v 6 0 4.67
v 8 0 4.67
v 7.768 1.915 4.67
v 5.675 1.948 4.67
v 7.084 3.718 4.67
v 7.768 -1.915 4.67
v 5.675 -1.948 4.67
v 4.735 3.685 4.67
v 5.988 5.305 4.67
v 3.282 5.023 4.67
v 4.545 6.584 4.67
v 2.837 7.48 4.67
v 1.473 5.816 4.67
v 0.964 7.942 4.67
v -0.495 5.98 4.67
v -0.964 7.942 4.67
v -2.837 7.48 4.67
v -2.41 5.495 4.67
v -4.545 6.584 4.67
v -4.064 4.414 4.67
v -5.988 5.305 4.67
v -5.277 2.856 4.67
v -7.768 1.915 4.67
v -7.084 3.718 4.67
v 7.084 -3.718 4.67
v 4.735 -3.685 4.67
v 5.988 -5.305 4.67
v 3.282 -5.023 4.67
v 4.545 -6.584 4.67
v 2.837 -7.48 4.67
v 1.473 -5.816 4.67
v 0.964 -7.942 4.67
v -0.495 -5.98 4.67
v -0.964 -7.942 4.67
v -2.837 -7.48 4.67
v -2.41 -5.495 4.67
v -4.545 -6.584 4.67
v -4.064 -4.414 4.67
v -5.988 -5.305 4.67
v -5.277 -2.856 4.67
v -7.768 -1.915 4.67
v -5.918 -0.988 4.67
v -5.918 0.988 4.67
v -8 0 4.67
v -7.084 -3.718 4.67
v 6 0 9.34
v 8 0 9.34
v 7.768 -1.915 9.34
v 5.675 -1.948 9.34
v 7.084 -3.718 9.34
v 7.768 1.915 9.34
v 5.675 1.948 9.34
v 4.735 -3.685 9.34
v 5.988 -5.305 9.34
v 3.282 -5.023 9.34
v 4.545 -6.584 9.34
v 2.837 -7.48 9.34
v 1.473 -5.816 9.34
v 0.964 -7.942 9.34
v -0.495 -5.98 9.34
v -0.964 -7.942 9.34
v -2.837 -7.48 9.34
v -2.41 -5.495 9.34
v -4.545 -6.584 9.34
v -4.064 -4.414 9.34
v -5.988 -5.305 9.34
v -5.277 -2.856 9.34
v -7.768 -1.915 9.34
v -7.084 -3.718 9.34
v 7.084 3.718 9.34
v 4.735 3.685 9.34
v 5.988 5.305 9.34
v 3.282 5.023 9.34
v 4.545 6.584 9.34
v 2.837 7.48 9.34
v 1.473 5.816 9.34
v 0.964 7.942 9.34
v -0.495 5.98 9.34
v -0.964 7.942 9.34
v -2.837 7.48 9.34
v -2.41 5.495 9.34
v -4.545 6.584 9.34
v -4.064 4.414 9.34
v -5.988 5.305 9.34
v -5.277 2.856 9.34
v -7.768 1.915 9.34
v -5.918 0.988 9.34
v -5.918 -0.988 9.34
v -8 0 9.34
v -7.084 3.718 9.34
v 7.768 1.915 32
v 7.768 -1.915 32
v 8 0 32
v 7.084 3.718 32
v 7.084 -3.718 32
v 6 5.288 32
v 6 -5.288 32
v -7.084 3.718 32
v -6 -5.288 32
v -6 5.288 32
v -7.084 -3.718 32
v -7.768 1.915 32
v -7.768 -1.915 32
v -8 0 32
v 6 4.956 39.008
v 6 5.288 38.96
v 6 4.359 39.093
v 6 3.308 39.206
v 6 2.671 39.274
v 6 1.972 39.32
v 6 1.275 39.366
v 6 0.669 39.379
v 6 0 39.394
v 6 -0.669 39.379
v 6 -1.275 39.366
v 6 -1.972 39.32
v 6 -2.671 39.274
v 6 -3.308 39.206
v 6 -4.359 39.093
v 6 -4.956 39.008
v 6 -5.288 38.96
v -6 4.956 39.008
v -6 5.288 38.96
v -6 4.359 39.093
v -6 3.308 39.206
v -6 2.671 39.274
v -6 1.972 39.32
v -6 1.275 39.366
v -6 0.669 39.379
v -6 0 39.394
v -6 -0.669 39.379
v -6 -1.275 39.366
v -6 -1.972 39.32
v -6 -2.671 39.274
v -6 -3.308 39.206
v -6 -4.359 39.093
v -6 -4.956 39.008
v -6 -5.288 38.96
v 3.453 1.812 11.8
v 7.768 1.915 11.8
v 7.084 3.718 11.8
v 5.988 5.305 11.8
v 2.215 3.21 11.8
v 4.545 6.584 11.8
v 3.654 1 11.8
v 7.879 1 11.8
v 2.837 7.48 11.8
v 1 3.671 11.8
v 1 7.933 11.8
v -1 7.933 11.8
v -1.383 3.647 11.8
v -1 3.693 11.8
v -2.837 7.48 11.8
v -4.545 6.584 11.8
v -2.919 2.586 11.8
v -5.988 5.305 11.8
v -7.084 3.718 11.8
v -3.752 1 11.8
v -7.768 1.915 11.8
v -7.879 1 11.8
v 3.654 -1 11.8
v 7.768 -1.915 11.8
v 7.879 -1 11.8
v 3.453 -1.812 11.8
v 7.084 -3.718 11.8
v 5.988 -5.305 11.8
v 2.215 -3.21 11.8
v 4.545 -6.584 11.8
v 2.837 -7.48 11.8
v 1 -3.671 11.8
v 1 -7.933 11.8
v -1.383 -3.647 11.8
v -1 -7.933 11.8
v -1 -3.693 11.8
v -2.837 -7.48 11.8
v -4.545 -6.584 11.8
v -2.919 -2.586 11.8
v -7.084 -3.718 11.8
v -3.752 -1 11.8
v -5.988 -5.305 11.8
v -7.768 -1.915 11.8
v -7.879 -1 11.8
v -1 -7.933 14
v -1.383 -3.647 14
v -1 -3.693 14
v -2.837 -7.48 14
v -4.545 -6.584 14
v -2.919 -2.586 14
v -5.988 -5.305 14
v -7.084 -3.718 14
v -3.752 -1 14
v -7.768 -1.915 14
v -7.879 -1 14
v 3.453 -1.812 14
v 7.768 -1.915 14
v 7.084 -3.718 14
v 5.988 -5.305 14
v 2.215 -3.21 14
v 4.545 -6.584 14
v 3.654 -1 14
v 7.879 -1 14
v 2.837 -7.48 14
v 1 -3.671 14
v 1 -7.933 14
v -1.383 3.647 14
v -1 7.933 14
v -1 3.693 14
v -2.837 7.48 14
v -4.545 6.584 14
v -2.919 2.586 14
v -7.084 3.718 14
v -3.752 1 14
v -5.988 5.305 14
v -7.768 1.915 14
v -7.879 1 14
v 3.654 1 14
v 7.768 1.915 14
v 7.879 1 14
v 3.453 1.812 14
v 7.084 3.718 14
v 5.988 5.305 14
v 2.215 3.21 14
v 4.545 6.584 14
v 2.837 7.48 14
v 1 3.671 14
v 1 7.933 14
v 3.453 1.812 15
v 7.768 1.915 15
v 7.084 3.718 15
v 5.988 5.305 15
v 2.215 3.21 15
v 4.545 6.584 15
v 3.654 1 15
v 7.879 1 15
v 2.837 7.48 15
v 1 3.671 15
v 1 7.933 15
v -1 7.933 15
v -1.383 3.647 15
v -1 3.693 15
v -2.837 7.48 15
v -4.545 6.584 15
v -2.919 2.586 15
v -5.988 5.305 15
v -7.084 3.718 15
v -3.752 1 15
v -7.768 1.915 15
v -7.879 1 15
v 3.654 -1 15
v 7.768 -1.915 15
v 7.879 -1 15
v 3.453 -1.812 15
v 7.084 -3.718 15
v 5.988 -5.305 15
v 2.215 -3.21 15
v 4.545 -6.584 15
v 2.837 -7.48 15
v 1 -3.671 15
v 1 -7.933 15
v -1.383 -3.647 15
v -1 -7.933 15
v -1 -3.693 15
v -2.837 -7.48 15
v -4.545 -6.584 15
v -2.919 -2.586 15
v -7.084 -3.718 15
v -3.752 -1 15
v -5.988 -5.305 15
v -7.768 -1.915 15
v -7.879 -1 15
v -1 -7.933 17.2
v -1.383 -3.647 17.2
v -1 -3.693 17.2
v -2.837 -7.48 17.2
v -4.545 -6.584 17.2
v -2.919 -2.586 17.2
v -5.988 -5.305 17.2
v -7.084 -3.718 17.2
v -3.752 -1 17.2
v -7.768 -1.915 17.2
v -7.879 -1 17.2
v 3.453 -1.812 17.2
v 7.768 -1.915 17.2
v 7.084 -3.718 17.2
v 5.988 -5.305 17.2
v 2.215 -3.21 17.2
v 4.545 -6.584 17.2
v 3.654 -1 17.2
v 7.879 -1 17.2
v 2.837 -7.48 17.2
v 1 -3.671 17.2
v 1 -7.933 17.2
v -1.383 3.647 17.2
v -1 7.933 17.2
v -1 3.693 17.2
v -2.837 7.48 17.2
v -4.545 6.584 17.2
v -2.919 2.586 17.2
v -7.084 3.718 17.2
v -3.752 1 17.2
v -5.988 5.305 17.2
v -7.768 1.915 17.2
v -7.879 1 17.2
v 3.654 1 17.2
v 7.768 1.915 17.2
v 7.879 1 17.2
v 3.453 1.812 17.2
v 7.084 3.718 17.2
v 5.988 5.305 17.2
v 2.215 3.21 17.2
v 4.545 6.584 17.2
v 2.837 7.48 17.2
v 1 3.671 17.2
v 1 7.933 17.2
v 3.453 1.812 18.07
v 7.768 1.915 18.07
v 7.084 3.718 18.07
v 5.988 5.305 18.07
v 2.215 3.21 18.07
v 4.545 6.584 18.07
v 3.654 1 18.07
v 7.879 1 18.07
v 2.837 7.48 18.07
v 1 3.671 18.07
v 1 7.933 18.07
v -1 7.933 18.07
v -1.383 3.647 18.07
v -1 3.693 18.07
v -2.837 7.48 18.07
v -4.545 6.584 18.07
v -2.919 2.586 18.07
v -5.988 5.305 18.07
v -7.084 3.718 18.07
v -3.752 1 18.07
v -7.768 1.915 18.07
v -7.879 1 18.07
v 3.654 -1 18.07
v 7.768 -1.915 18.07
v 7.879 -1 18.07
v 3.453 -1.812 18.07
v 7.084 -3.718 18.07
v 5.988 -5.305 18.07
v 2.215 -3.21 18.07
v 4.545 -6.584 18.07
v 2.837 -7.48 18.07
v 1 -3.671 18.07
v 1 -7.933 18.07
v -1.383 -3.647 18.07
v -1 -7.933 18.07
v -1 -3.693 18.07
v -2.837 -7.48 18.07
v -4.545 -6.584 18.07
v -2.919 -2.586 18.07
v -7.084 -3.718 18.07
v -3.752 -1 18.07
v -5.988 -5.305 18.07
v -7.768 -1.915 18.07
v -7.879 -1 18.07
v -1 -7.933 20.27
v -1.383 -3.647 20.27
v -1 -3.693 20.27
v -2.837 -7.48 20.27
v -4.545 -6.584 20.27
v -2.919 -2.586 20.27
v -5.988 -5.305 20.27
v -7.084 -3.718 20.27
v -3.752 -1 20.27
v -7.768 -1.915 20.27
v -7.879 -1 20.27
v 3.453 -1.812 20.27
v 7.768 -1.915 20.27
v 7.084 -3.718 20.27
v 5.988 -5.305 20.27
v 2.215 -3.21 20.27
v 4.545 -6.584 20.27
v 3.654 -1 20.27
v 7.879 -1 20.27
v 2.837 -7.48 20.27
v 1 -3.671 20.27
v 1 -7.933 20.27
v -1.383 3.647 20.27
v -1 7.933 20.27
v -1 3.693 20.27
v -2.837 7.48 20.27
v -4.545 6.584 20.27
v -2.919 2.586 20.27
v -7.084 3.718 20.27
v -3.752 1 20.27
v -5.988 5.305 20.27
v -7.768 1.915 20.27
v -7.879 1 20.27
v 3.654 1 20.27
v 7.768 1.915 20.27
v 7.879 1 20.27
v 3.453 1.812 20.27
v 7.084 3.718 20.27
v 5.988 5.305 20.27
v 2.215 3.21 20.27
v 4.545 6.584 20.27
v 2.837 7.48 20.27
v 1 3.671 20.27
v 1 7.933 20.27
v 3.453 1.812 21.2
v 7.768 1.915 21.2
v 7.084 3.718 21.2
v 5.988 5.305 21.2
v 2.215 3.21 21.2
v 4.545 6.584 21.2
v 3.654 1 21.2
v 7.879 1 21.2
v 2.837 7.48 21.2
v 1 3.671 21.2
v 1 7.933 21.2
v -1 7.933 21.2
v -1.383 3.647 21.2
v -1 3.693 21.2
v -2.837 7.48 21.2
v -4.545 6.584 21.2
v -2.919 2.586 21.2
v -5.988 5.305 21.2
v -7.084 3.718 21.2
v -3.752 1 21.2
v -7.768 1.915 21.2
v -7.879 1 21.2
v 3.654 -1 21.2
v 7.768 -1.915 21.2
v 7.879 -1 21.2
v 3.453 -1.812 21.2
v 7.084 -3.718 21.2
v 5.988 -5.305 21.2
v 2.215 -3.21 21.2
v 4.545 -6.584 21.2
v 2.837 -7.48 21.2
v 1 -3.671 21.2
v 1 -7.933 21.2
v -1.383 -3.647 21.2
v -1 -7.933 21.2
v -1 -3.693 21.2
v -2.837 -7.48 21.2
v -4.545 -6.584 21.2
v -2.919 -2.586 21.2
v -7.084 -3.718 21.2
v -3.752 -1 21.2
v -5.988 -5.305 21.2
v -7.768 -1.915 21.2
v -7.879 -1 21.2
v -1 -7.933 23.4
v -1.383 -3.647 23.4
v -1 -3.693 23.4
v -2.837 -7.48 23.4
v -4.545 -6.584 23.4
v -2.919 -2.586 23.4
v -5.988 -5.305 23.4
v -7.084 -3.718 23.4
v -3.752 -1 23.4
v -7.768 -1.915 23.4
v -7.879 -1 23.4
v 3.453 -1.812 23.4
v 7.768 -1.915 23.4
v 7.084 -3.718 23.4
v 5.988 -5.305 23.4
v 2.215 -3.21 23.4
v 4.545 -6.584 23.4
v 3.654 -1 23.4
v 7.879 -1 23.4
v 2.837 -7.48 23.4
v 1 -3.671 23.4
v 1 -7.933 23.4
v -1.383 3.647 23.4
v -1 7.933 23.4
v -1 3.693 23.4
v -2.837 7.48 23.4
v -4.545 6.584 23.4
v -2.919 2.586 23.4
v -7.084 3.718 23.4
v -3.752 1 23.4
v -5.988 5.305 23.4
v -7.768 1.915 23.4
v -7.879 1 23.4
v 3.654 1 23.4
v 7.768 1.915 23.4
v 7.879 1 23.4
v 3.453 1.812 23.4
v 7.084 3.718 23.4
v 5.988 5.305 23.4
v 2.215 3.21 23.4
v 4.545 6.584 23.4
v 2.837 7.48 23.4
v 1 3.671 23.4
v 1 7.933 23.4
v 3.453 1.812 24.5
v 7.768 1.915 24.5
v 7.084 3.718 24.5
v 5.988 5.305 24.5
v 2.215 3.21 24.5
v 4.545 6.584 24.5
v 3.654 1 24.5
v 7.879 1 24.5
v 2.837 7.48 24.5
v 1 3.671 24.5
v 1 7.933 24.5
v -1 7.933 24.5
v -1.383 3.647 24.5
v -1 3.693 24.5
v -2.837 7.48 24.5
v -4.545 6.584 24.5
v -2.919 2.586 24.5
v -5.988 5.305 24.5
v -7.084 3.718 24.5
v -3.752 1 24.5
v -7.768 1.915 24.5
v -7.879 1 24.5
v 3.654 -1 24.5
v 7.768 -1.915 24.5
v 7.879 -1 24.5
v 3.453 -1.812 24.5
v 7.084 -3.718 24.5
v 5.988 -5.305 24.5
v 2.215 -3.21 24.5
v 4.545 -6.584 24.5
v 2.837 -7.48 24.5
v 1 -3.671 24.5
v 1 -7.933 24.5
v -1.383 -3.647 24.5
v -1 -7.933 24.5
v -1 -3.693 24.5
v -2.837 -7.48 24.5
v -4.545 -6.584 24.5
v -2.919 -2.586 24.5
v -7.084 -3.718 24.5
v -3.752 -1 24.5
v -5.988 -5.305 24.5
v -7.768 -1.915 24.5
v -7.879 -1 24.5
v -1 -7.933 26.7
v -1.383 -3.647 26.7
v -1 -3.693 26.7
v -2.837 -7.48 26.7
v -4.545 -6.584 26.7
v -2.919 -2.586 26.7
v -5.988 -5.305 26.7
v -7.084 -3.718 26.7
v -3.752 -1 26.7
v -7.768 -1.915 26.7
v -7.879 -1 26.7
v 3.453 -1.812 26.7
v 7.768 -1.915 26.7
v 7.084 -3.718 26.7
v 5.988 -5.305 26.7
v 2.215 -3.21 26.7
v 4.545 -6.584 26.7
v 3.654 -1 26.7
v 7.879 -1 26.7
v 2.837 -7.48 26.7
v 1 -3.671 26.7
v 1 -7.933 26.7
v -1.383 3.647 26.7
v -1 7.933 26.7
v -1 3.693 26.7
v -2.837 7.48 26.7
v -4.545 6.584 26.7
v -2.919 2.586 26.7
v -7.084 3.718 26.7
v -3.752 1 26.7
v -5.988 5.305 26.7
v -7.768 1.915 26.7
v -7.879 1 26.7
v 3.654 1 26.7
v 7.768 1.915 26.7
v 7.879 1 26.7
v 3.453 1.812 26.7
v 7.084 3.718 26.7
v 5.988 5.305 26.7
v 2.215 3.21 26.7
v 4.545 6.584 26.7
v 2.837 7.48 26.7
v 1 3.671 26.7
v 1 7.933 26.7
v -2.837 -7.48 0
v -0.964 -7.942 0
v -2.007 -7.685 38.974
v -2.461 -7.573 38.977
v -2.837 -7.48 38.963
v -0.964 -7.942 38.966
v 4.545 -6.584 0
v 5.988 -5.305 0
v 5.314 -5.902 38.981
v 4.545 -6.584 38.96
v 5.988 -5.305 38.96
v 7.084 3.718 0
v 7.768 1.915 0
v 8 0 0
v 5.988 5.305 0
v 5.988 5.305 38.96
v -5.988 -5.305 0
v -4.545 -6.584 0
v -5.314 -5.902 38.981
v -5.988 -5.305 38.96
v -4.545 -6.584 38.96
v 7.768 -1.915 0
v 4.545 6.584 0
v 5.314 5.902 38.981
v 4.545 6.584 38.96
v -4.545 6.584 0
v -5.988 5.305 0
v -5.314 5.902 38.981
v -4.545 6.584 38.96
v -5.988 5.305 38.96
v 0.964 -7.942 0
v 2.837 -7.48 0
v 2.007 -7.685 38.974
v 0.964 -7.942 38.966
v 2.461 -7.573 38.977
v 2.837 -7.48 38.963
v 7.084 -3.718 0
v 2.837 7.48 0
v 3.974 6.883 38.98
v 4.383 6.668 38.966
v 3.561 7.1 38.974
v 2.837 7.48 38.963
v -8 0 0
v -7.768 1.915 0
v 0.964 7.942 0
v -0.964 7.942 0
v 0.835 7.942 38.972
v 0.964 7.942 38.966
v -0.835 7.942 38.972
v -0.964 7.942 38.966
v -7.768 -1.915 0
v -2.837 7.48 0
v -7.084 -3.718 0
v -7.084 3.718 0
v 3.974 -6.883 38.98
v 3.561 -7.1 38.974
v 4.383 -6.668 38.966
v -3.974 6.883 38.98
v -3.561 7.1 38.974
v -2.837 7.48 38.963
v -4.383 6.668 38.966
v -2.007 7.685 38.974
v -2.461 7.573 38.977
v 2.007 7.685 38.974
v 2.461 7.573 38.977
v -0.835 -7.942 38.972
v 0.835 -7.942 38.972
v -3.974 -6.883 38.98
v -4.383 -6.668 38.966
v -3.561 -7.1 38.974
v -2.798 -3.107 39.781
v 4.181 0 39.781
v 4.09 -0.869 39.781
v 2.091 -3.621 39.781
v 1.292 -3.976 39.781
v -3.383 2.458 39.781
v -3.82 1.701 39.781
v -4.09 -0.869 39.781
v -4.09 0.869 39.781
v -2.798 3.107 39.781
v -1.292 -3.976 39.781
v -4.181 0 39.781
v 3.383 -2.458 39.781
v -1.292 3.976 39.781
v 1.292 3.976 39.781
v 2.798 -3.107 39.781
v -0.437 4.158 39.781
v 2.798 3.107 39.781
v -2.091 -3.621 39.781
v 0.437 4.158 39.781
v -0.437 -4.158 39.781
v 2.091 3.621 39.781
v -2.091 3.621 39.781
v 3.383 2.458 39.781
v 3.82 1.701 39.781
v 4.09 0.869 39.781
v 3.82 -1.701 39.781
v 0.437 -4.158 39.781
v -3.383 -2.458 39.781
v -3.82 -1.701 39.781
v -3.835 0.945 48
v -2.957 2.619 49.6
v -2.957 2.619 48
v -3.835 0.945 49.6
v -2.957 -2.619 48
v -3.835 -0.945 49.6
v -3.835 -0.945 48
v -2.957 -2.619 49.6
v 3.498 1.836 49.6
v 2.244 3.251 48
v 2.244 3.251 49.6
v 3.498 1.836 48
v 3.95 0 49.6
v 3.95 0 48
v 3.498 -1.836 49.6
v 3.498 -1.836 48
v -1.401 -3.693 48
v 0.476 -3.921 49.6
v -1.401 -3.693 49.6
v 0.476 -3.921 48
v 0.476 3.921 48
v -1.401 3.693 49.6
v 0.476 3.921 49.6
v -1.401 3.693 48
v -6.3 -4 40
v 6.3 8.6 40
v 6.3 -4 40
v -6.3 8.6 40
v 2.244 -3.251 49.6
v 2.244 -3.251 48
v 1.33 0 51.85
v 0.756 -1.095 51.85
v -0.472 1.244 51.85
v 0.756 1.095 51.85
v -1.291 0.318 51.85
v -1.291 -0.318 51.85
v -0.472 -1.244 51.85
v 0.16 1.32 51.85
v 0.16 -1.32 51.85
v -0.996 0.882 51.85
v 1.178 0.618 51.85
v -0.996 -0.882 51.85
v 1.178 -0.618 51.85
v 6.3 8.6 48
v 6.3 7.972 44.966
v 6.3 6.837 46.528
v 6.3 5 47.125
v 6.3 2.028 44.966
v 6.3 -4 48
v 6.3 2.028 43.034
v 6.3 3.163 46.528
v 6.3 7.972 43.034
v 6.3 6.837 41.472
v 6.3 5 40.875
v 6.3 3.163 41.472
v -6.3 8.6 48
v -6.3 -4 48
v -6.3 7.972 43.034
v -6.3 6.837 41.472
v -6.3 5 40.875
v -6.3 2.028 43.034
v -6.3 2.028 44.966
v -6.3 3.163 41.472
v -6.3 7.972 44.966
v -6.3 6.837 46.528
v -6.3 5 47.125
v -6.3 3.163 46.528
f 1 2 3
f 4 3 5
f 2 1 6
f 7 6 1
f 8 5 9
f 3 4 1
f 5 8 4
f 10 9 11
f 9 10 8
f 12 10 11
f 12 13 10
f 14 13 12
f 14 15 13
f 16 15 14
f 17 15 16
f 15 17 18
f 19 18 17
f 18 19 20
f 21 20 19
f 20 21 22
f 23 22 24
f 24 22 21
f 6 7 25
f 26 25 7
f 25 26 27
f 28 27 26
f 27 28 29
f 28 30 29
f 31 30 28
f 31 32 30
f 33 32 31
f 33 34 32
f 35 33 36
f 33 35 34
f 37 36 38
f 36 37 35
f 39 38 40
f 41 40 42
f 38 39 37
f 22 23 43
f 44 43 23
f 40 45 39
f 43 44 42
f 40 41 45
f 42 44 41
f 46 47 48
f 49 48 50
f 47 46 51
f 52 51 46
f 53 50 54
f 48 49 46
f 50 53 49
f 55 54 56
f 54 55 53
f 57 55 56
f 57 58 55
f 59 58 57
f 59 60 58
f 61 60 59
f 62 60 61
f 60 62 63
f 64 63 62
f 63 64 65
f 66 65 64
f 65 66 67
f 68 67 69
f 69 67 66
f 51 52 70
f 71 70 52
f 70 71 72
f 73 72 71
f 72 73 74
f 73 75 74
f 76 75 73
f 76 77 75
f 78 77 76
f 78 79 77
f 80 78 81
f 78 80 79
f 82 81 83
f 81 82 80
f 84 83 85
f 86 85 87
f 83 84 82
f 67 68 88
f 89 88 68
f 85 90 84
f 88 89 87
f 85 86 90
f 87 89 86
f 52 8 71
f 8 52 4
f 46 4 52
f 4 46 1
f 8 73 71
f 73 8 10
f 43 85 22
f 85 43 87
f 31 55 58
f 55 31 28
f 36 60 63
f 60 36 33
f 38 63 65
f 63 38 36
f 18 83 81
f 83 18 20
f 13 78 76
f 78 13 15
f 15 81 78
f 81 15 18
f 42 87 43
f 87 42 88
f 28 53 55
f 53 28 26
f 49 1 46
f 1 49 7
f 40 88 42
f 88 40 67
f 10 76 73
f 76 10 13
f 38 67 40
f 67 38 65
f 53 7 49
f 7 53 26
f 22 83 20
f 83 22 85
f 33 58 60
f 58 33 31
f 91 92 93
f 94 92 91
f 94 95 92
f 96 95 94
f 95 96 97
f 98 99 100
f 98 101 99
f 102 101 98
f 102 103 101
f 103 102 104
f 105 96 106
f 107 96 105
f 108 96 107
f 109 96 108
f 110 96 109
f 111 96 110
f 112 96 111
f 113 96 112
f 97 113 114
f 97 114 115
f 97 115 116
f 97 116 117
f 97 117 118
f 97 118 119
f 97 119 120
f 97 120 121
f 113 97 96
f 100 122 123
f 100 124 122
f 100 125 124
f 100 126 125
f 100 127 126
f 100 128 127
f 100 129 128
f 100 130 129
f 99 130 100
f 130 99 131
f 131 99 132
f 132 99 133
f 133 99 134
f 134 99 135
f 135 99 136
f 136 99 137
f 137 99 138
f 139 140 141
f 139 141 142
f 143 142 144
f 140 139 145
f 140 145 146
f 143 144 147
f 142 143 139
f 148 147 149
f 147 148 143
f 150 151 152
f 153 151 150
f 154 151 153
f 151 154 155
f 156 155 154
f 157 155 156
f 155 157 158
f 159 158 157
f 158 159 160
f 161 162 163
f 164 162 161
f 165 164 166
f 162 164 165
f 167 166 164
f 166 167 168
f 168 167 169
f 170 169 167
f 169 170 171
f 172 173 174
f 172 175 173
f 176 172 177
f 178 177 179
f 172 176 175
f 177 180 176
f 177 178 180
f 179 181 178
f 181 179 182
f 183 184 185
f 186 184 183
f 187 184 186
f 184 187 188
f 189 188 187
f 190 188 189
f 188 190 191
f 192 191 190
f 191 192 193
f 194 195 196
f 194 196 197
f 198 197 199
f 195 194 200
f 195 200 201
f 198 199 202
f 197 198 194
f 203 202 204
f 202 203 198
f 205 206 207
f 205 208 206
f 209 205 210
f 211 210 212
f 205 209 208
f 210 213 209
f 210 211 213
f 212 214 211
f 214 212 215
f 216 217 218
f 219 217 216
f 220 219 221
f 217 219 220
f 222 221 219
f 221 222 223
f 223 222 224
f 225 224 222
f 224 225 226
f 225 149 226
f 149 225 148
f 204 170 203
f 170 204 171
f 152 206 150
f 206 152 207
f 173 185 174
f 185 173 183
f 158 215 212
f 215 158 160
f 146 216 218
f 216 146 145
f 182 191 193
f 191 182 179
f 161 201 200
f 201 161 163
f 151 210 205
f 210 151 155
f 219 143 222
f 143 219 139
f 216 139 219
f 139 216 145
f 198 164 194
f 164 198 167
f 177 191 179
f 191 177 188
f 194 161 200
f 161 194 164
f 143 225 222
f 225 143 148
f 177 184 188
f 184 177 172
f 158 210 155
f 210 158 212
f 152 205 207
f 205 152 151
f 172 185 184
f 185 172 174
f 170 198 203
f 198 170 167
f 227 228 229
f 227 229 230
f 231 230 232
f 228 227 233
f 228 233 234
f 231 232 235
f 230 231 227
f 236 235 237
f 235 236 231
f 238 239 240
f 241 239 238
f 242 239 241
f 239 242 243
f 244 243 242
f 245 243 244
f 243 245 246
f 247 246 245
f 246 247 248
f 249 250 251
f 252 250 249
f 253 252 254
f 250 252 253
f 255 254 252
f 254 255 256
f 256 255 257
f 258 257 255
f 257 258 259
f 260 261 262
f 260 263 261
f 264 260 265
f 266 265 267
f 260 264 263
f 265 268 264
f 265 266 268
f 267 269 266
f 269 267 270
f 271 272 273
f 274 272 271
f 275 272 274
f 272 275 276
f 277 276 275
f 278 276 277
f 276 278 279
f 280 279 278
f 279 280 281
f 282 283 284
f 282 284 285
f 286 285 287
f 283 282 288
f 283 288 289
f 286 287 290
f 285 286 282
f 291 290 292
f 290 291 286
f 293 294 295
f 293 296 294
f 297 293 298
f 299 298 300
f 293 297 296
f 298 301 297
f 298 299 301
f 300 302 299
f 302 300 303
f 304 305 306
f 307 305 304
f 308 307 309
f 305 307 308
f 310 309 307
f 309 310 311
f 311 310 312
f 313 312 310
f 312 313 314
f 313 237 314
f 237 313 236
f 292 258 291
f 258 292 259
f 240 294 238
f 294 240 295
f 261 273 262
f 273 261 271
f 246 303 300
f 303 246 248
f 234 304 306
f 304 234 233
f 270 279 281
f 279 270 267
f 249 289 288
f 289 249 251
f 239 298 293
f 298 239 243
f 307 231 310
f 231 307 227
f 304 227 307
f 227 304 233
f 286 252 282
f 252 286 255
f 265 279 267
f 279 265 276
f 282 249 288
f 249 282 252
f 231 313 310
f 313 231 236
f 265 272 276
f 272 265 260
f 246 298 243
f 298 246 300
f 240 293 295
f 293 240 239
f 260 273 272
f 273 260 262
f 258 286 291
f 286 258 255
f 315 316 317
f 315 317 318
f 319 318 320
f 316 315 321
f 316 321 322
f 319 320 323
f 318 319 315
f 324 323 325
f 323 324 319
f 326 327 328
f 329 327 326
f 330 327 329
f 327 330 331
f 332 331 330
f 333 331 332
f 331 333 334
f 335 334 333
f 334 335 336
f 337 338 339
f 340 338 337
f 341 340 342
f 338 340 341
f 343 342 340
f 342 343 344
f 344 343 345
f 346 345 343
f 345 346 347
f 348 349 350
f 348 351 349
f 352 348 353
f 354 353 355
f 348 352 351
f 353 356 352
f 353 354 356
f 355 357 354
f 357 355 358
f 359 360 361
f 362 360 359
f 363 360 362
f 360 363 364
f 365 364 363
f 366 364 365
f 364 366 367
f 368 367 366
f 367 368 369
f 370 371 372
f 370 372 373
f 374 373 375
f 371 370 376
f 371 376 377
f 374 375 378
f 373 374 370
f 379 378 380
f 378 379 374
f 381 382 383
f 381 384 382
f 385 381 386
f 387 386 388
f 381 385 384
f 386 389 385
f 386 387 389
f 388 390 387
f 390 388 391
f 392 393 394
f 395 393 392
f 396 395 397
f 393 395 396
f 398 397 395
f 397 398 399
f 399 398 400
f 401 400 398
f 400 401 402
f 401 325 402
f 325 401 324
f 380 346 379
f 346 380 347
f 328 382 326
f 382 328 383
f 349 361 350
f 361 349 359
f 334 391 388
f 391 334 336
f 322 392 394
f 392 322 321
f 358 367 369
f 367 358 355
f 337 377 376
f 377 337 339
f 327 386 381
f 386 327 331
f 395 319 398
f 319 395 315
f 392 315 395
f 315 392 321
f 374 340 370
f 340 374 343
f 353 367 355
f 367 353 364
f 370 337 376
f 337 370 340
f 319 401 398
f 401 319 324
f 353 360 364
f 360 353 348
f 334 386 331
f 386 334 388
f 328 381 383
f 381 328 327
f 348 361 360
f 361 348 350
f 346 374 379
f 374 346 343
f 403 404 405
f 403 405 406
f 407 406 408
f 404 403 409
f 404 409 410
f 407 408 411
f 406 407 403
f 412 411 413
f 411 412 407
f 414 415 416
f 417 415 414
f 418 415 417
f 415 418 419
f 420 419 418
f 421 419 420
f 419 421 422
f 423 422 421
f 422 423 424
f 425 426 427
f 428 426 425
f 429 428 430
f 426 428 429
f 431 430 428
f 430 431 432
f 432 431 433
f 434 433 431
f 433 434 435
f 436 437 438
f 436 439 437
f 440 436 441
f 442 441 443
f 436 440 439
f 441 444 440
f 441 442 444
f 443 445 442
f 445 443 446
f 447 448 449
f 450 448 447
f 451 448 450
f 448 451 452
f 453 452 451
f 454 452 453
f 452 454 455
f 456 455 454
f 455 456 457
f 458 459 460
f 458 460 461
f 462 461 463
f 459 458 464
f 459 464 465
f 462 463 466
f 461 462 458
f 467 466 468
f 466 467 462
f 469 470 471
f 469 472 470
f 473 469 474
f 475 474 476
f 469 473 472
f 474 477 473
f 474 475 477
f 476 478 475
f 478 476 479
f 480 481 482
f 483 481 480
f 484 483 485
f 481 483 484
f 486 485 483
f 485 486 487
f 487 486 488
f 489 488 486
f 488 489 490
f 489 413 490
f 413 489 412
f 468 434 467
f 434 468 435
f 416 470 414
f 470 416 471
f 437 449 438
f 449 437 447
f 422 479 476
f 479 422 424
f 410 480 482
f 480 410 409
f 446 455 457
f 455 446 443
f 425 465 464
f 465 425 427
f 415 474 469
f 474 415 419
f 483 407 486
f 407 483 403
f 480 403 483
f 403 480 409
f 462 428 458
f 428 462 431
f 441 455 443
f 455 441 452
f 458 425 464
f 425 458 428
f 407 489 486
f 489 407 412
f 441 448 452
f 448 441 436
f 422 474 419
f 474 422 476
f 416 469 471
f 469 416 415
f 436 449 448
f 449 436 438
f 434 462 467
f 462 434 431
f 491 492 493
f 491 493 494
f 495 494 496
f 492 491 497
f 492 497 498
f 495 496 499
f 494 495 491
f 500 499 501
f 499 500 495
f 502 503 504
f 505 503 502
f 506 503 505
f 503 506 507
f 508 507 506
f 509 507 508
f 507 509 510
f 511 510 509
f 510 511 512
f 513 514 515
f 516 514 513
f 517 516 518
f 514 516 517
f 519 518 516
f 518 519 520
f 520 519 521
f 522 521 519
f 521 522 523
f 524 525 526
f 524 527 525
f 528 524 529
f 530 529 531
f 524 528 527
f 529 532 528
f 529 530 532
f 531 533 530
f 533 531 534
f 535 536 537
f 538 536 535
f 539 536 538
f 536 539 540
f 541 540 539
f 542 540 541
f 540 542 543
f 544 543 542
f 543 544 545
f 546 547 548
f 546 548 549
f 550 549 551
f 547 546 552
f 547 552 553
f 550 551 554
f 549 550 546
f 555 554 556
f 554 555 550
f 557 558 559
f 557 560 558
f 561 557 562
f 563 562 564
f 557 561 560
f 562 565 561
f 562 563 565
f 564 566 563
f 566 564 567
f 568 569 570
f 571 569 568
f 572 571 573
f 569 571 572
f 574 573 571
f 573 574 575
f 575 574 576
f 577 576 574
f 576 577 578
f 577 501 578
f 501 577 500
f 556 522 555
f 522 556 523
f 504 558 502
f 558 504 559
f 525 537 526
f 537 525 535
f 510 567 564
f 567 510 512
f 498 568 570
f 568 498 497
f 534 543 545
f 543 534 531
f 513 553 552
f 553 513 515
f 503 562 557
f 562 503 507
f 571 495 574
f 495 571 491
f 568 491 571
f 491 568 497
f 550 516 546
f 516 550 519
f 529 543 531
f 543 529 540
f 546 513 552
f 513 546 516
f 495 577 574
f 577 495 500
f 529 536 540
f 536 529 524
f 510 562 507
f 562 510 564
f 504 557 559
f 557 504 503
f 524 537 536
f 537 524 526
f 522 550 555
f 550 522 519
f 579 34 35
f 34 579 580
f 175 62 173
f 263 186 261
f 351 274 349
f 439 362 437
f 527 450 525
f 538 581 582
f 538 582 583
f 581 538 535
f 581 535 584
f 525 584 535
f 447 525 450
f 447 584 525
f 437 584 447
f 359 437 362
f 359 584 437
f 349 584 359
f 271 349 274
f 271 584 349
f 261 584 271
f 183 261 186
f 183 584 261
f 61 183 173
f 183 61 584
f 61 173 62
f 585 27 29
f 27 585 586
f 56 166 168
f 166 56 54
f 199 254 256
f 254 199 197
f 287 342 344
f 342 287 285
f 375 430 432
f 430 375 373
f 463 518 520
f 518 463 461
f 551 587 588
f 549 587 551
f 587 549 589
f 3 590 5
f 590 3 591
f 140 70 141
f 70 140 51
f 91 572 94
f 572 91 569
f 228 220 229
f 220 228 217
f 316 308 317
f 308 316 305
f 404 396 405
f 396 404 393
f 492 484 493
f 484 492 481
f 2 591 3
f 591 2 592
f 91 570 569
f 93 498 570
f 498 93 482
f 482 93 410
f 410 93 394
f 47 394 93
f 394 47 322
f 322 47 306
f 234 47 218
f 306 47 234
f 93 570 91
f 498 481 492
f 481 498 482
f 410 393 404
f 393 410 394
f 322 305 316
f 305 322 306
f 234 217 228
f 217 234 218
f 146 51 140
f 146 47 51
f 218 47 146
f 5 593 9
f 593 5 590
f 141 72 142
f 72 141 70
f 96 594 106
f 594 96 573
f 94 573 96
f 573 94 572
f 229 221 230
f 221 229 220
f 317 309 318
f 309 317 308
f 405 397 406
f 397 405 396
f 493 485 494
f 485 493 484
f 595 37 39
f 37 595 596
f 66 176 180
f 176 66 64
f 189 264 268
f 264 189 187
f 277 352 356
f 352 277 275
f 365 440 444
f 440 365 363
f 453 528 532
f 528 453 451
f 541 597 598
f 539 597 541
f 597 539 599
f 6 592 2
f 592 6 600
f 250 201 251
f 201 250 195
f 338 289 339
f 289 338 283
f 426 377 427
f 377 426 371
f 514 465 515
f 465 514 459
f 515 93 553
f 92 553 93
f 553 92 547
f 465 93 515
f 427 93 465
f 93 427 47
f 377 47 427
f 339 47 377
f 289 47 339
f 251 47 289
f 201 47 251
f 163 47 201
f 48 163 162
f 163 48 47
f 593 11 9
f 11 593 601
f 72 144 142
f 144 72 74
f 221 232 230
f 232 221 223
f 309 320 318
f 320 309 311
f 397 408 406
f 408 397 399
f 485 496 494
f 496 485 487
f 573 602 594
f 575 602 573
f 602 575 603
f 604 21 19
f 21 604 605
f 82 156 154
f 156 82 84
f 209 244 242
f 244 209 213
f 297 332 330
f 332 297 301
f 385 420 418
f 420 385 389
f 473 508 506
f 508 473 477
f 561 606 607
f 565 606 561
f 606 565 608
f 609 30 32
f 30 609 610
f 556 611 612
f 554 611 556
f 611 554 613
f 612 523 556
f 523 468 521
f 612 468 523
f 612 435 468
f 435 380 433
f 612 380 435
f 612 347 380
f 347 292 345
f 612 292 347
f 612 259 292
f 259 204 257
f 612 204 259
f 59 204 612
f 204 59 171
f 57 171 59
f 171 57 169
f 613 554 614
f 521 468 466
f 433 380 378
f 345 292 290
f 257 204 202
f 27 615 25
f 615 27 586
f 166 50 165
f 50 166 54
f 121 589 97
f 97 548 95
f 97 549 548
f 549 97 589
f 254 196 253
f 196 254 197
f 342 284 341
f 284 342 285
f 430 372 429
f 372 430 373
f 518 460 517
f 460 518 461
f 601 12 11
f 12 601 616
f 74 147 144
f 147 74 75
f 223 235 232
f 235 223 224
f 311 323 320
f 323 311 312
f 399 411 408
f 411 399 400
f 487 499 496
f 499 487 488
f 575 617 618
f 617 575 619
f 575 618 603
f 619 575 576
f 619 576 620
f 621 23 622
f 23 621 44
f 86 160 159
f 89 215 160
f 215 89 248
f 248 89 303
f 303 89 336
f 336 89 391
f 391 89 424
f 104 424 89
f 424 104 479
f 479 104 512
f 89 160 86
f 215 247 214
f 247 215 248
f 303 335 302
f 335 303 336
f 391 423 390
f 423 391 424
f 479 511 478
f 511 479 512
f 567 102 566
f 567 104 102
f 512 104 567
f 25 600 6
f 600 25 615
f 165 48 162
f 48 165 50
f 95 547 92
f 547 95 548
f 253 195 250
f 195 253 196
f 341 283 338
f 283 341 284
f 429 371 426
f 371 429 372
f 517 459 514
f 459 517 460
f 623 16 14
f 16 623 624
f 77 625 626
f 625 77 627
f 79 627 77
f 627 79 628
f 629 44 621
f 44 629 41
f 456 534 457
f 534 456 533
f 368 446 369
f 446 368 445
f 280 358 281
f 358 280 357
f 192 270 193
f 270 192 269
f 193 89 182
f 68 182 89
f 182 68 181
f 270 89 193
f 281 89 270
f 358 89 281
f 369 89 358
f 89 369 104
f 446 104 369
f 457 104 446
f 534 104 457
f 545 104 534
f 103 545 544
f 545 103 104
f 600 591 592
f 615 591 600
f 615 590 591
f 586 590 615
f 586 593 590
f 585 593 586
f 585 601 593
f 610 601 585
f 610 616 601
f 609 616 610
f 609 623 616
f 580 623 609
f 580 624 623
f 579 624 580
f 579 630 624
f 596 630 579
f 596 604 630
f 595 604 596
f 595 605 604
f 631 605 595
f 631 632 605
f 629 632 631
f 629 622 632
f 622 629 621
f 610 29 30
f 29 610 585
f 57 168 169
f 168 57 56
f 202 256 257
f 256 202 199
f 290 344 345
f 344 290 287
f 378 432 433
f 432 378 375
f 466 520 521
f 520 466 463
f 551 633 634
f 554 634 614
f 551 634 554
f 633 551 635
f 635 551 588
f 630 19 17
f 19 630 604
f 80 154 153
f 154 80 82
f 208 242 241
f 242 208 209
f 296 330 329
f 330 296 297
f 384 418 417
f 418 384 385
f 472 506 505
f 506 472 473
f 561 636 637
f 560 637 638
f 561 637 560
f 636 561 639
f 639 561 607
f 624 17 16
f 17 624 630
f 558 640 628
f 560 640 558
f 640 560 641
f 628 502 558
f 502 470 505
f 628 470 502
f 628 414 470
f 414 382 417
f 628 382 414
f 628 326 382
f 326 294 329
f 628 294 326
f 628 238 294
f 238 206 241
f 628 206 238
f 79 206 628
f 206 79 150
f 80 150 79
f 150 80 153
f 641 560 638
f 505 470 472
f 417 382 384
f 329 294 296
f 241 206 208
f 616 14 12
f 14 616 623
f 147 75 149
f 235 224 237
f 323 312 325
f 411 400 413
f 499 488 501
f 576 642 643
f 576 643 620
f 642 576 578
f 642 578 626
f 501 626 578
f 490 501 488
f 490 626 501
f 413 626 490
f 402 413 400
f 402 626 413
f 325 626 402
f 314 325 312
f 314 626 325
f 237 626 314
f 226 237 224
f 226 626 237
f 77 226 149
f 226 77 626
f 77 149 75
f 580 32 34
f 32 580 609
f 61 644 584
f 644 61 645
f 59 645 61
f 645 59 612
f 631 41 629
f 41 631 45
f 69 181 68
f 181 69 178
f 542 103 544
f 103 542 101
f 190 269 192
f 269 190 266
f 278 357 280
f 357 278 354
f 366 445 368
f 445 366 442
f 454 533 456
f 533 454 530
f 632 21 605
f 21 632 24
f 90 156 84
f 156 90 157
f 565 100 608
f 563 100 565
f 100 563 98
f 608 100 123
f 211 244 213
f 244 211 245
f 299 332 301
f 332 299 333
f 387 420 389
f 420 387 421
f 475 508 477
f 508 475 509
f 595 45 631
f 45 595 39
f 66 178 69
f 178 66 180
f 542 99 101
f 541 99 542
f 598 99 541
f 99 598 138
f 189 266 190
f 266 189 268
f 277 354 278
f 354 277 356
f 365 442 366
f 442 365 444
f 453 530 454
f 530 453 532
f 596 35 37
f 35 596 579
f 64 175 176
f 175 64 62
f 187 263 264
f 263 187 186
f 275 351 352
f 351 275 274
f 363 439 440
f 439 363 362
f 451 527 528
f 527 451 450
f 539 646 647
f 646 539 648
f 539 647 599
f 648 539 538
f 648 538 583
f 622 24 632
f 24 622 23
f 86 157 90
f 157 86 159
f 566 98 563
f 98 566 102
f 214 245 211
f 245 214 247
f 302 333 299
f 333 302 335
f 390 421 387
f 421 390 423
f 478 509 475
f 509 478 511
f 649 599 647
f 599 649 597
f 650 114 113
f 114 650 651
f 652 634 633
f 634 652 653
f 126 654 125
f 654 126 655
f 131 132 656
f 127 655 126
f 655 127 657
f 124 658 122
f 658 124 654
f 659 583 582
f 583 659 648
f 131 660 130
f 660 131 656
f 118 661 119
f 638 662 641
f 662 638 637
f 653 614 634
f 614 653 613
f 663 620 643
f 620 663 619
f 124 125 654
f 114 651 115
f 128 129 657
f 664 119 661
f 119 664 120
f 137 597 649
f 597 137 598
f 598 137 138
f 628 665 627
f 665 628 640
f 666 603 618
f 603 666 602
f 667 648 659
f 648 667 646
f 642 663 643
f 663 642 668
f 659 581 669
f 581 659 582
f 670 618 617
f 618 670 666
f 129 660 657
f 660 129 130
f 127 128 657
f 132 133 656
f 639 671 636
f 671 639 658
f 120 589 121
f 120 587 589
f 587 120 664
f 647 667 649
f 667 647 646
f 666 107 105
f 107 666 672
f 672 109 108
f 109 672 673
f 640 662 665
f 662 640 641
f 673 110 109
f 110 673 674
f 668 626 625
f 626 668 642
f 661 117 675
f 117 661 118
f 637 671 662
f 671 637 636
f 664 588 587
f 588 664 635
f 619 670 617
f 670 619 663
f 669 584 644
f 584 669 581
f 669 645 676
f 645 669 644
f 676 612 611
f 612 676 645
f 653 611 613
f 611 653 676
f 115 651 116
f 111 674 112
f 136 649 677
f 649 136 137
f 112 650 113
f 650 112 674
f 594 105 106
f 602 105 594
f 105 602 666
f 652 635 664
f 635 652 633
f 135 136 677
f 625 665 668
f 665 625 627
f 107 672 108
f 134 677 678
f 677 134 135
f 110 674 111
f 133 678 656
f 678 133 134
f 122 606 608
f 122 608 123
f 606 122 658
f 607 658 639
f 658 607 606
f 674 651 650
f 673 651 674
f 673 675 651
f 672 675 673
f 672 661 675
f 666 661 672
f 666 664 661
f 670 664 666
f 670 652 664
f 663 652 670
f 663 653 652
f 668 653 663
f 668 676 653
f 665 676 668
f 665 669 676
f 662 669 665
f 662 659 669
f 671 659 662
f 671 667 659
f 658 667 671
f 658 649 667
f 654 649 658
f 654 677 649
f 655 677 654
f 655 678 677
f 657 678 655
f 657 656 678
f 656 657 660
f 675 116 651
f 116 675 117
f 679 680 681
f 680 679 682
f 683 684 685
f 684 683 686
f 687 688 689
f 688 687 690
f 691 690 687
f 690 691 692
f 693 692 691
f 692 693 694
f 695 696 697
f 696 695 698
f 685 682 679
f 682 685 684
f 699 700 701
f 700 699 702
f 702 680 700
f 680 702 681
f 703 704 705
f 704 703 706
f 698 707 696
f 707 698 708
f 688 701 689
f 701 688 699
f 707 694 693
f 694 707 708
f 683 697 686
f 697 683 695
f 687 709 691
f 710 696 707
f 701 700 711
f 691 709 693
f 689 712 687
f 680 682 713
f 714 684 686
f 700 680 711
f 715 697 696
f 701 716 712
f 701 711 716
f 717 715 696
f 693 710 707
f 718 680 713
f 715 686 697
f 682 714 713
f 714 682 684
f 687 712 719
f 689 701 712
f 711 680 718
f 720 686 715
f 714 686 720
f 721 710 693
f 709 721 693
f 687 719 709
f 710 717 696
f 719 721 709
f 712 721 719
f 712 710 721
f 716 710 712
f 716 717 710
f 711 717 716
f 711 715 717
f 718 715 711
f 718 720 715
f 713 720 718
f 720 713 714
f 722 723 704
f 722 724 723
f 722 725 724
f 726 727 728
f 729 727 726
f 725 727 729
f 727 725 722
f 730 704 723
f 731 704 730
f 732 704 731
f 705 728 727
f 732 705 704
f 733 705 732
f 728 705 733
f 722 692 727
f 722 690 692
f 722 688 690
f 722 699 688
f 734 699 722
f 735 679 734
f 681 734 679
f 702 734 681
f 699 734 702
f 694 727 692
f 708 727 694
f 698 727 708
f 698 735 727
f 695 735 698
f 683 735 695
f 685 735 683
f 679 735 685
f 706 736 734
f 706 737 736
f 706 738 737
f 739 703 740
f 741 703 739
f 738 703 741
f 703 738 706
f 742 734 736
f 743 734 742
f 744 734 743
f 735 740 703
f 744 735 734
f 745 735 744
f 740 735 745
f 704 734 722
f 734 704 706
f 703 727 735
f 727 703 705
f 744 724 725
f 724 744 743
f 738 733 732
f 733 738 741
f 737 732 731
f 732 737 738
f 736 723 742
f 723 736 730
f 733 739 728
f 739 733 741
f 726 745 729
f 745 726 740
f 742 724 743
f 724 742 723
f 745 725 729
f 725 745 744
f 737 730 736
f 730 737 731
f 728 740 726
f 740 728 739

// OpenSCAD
// From https://raw.github.com/TauNeutrino/OpenSCAD-Files/master/jhead.scad

black = [0.2, 0.2, 0.2];

hotend_jhead();

module hotend_jhead() {
	translate([0,0,0])  color(black) jhead_plastic_body();
	translate([0,0,40]) jhead_brass_nozzle();
}

module jhead_plastic_body() {
	intersection() {
	difference() {
		cylinder(h=40,r=8);
		translate([0,0,4.67]) jhead_groovemount_cutout();
	
		// add the wrench flats
		translate([0,0,32]) jhead_wrench_cutout();
		
		// add (crappy) cooling grooves
		translate([0,0,11.80]) jhead_cooling_cutout();
		translate([0,0,15.00]) jhead_cooling_cutout();
		translate([0,0,18.07]) jhead_cooling_cutout();
		translate([0,0,21.20]) jhead_cooling_cutout();
		translate([0,0,24.50]) jhead_cooling_cutout();
	}
	// get the rounded bit at the end
	sphere(r=40);
	}
}

module jhead_groovemount_cutout() {
	difference() {
		cylinder(h=4.67,r=10);
		cylinder(h=4.67,r=6);
	}
}

module jhead_wrench_cutout() {
	difference() {
		translate([-10,-10,0]) cube([20,20,8]);
		translate([-6,-10,0])  cube([12,20,8]);
	}
}

module jhead_cooling_cutout() {
	render() difference() {
		difference() {
			cylinder(h=2.20,r=10);		
			translate([-1,-10,0]) cube([2,20,2.2]);
			translate([-10,-1,0]) cube([20,2,2.2]);
		}
		cylinder(h=2.20,r=3.9);
	}
}

module jhead_brass_nozzle() { 
	// heater body 12.65 x 12.65 x 8
	//
	//
	difference() {
	union() {
	// draw the cylinder and cap it with the nozzle
	translate([0,0,0])     cylinder(h=9.60, r=3.95);
	translate([0,0,9.6])   cylinder(h=2.25, r1=3.95, r2=1.33);
	translate([-6.3,-4,0]) cube([12.6,12.6,8]);
	}
	translate([6.4,5,4]) rotate([0,270,0]) cylinder(h=12.8,r=3.125);
	}
}
